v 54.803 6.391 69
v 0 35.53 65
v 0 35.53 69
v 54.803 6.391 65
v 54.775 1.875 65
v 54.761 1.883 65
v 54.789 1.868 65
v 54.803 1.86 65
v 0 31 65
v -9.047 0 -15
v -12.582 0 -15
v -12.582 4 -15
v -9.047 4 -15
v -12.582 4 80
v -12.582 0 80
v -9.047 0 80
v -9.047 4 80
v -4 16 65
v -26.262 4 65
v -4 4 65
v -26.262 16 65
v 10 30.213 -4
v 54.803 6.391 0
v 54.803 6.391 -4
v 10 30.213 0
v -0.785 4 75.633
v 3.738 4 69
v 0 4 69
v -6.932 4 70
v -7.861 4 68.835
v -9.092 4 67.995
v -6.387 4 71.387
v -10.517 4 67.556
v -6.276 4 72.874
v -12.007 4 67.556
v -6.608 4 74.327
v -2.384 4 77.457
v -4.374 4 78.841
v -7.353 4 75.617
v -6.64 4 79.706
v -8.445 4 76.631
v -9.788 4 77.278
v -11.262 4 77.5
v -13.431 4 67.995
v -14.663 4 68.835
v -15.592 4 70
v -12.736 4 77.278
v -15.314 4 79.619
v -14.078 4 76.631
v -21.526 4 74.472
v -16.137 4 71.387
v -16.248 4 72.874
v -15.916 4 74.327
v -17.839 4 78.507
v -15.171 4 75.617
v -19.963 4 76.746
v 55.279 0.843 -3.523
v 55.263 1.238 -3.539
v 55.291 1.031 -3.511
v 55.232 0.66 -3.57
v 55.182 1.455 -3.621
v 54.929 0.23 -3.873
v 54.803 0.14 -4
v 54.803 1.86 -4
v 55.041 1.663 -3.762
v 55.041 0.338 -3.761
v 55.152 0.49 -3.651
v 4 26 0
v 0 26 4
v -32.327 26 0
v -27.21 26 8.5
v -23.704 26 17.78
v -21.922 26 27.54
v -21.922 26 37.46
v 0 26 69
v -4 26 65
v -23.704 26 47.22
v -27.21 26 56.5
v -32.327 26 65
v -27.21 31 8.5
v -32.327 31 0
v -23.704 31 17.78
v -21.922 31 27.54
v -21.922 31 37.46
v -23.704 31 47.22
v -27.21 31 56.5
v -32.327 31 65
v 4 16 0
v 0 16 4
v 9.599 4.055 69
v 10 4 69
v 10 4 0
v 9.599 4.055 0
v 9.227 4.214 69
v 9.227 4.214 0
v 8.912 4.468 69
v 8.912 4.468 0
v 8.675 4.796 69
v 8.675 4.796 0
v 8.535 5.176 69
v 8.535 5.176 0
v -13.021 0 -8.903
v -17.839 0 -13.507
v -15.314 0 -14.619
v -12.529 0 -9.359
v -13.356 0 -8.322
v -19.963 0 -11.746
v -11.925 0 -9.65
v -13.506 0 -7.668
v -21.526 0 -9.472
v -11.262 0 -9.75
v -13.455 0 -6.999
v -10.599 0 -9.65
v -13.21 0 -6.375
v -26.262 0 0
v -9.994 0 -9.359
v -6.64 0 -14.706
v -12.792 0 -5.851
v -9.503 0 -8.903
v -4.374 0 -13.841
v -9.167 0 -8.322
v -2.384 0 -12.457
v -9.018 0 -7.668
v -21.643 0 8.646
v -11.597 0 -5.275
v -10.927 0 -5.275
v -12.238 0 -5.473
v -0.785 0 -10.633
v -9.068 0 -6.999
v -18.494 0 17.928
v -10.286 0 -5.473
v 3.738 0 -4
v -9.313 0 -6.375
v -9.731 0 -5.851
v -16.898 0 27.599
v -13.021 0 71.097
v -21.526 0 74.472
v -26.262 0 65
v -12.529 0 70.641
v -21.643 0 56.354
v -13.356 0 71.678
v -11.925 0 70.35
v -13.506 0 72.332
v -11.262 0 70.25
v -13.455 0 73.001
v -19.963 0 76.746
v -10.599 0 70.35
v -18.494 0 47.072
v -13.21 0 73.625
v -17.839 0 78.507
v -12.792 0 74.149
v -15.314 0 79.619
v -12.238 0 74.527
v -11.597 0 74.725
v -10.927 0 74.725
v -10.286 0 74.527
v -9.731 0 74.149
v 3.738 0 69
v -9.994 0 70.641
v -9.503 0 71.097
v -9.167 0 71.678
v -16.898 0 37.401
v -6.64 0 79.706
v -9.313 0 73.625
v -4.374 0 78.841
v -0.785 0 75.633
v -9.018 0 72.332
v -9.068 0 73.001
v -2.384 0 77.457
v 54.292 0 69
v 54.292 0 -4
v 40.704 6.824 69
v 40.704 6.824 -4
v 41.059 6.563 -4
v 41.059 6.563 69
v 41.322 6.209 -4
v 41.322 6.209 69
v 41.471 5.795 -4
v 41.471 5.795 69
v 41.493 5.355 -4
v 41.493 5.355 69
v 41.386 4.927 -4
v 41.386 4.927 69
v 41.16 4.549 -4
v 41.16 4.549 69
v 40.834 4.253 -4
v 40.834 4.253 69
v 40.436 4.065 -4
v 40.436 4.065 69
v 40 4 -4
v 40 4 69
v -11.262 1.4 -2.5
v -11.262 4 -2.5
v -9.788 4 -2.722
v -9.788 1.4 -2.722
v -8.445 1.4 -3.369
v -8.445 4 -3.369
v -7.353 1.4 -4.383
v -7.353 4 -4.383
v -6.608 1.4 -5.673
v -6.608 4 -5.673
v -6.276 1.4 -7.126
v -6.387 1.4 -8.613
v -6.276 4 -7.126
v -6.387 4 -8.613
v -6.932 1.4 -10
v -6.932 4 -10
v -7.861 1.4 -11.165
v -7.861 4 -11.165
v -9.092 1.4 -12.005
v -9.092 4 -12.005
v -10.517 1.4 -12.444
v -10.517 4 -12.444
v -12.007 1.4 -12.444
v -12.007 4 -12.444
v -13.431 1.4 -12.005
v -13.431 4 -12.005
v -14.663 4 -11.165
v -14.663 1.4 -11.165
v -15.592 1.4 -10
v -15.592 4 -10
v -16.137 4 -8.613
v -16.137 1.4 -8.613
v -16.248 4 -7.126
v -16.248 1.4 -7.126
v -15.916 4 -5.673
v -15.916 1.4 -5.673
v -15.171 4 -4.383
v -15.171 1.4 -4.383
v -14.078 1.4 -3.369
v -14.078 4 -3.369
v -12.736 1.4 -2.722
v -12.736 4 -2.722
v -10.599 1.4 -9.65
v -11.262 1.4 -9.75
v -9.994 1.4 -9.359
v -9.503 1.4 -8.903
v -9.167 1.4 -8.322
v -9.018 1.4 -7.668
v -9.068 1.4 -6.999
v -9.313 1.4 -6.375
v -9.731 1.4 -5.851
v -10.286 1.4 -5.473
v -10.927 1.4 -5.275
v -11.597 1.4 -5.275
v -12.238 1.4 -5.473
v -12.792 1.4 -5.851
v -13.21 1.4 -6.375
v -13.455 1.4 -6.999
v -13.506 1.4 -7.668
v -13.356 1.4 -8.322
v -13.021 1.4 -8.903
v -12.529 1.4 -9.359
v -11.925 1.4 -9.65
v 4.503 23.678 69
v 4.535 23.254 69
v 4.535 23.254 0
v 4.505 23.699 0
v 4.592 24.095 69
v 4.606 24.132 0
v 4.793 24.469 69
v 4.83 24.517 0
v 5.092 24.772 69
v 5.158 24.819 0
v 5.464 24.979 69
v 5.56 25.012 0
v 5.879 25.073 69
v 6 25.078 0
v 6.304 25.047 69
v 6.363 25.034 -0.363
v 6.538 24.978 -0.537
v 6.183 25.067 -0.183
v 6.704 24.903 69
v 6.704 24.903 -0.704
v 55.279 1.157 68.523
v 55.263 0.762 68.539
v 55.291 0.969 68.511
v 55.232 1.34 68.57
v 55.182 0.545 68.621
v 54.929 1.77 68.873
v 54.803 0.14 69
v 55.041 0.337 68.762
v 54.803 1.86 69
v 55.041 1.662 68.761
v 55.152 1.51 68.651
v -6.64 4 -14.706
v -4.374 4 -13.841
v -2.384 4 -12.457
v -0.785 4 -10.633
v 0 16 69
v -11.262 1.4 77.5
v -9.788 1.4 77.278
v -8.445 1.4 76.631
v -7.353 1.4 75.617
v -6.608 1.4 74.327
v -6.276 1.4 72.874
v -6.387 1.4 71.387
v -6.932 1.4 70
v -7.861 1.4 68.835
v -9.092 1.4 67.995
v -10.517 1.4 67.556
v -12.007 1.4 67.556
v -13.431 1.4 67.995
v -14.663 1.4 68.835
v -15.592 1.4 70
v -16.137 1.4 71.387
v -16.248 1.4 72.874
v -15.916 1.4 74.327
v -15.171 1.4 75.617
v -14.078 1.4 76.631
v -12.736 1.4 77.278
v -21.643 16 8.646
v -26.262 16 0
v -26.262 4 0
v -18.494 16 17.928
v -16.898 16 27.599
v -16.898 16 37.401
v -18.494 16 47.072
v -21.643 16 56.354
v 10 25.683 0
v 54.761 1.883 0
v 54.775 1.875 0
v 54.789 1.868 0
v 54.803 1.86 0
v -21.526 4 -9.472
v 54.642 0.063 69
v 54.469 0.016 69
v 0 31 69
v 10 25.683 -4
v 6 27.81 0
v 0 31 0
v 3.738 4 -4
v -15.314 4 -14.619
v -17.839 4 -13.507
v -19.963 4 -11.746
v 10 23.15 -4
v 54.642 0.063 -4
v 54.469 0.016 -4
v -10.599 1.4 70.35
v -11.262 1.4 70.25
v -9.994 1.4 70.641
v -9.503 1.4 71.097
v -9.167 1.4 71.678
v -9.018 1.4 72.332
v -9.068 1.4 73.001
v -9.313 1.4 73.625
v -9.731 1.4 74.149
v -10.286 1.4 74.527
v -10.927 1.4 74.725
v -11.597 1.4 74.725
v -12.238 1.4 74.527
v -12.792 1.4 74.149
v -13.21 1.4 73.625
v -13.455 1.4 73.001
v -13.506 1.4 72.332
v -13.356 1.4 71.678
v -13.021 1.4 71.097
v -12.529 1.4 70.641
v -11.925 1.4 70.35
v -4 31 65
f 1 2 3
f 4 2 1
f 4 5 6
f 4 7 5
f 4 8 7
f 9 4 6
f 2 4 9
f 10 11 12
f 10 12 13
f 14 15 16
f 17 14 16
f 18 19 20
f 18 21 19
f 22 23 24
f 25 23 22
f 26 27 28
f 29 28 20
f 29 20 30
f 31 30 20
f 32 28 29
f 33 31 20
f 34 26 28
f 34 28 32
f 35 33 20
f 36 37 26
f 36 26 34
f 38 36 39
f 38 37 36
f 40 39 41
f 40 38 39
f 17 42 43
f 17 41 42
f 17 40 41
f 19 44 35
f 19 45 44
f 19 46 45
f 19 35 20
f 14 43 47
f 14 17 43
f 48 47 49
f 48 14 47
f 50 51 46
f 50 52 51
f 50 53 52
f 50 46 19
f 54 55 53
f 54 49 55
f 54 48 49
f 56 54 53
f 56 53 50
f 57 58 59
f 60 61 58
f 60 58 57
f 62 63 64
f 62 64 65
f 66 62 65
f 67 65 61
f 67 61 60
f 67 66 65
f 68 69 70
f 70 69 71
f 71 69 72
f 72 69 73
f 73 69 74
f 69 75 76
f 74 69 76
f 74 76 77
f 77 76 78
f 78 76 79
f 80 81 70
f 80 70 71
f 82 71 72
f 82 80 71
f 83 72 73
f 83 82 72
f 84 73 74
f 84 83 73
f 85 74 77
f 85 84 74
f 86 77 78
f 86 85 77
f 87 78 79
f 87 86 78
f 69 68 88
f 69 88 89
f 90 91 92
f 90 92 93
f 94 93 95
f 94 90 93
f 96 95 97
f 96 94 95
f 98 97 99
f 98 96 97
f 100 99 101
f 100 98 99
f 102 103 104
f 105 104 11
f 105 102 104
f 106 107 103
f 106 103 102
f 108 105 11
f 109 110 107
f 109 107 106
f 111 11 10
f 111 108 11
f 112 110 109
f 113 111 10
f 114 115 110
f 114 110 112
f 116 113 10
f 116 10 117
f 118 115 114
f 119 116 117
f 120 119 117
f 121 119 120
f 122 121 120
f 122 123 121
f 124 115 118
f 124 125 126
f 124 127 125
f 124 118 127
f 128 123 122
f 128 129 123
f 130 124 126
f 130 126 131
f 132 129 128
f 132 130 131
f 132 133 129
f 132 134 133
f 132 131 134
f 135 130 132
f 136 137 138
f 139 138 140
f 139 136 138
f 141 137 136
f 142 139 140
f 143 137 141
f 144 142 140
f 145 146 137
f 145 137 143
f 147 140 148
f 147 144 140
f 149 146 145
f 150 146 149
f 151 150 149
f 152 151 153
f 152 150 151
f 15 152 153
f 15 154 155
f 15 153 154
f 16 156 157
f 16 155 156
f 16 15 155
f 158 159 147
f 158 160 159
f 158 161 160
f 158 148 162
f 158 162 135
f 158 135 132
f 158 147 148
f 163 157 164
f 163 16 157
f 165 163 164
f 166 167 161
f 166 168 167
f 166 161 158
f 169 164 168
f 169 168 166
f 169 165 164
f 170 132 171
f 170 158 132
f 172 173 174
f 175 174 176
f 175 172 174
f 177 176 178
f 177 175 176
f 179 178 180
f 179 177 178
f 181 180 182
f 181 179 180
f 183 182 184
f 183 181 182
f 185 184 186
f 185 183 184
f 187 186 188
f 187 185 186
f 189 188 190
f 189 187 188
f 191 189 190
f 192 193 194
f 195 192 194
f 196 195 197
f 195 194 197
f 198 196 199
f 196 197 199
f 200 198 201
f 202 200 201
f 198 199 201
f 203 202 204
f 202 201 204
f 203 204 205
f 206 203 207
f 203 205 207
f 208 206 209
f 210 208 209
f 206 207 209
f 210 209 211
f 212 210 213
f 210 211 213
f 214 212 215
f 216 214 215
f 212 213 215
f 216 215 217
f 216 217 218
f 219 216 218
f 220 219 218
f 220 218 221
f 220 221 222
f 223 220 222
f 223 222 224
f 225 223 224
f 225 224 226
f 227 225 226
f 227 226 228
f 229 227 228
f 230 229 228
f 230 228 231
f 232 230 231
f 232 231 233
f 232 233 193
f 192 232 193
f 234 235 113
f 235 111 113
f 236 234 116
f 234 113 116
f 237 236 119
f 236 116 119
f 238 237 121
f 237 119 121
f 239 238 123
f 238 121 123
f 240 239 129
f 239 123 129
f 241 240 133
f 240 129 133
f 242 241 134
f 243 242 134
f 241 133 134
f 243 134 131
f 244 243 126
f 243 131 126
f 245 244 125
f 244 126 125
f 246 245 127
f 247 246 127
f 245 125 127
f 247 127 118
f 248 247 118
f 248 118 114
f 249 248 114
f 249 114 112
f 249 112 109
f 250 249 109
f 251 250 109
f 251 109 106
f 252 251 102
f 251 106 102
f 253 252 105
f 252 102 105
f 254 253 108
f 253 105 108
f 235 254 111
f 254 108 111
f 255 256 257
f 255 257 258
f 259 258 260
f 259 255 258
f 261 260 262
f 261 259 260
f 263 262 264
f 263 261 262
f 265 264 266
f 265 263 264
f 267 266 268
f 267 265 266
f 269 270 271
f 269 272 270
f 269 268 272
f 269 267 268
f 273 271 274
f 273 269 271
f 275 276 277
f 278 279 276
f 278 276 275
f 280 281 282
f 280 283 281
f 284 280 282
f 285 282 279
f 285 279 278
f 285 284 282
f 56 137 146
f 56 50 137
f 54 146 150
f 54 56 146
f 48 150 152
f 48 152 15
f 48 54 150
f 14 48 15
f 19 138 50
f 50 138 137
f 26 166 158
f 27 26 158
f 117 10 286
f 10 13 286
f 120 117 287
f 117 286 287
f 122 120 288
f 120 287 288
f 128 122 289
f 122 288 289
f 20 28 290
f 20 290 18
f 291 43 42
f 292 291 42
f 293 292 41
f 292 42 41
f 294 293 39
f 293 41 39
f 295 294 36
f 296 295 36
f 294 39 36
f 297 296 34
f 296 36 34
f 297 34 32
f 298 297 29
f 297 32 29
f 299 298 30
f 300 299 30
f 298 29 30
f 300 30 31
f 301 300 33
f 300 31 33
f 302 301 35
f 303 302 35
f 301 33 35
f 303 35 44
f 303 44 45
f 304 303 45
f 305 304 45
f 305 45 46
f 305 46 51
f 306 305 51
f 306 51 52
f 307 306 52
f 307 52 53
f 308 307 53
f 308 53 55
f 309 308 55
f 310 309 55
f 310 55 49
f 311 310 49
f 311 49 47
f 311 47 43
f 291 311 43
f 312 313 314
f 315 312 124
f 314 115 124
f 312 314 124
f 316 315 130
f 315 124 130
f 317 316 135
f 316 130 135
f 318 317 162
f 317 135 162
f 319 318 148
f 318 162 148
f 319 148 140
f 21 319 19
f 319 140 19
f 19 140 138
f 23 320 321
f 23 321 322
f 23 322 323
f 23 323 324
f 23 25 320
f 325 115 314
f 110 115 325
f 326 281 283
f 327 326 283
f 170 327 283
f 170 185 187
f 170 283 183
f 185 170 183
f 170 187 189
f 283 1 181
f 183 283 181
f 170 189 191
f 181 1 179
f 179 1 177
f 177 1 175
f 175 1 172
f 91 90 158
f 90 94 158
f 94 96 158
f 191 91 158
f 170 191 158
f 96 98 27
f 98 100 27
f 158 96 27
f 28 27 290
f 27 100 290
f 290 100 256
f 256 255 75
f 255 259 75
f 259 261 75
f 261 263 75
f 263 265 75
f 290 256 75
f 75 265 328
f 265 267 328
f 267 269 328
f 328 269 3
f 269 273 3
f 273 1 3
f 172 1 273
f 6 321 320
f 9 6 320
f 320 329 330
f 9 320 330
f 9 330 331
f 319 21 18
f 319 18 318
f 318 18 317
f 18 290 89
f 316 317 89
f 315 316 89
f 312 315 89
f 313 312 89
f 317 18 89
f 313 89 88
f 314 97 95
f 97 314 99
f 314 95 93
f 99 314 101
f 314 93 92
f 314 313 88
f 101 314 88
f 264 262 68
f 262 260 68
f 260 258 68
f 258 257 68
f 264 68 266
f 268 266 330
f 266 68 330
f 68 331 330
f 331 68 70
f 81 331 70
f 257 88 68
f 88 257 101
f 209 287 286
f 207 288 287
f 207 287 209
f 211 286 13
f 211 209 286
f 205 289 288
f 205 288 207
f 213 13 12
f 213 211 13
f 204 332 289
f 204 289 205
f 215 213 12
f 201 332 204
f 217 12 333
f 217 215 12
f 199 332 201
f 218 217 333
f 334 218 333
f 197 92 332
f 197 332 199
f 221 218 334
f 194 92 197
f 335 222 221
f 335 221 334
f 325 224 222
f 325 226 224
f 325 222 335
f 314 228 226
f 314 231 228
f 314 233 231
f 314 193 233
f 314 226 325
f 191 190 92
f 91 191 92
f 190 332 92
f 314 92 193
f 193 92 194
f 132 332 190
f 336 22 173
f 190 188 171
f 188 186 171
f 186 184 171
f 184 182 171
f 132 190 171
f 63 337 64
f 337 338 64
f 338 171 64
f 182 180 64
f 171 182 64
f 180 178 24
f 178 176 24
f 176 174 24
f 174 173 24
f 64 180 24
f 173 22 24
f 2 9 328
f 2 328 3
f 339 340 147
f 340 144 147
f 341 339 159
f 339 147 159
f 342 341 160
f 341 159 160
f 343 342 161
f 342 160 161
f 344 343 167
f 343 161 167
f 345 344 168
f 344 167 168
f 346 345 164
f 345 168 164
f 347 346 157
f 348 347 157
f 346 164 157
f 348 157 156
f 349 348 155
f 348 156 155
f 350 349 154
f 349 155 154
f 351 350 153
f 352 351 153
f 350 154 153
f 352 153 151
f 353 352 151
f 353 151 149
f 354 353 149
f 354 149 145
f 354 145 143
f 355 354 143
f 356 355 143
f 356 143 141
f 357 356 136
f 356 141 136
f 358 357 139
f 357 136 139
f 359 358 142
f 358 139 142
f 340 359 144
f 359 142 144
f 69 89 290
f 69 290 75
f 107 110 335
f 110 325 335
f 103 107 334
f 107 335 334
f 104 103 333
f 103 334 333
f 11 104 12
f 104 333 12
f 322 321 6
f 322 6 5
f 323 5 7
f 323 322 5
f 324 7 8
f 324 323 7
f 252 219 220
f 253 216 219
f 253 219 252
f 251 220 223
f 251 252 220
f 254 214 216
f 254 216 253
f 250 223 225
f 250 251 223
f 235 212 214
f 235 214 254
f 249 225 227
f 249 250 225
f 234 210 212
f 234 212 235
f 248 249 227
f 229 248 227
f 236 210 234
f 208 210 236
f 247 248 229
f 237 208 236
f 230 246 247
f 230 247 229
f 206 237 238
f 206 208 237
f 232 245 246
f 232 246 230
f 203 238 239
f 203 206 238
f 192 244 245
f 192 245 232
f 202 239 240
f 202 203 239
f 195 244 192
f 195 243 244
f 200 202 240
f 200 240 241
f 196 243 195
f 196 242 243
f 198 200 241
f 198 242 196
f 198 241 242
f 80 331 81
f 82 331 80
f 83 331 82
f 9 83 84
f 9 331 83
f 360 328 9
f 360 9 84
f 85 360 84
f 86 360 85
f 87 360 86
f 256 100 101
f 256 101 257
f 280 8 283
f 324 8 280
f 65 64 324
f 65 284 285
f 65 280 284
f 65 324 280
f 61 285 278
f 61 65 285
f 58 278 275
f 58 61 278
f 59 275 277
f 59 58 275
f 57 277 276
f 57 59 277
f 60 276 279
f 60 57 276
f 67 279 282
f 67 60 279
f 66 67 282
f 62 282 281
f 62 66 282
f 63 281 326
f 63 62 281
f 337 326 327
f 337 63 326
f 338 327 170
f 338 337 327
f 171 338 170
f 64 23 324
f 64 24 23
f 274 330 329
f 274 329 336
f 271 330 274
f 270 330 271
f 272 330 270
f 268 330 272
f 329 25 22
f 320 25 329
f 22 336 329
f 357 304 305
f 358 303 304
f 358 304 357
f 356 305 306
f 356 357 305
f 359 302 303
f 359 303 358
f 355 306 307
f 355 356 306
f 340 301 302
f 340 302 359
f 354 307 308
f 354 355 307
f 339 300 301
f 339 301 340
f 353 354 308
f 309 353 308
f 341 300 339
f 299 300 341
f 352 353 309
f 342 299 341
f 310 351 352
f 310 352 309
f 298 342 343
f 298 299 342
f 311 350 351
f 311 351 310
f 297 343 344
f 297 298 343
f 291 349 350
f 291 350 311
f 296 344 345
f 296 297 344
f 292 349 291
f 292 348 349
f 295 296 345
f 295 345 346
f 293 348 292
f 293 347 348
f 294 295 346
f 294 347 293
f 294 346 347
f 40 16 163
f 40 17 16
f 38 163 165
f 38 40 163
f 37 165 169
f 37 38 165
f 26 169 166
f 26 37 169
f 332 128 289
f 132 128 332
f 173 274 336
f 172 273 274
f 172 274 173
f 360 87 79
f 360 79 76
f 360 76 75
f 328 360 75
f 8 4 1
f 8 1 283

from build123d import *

# Parameters (mm, degrees)
ESTRUSIONE_ESTRUSIONE1_DEPTH                         = 90
TAGLIO_ESTRUSIONE1_DEPTH                             = 60
SCHIZZO3_R                                           = 60
TAGLIO_ESTRUSIONE2_DEPTH                             = 21
ESTRUSIONE_ESTRUSIONE2_DEPTH                         = 4
FORO_LAMATO_PER_VITE_M4_A_TESTA_CILINDRI_D           = 4.5
FORO_LAMATO_PER_VITE_M4_A_TESTA_CILINDRI_DEPTH       = 8
FORO_LAMATO_PER_VITE_M4_A_TESTA_CILINDRI_CBORE_D     = 10
FORO_LAMATO_PER_VITE_M4_A_TESTA_CILINDRI_CBORE_DEPTH = 2.6
FORO_LAMATO_PER_VITE_M4_A_TESTA_CILINDRI_TIP         = 1.351936393
RACCORDO3_R                                          = 10
ESTRUSIONE_ESTRUSIONE3_DEPTH                         = 4
ESTRUSIONE_ESTRUSIONE4_DEPTH                         = 4
TAGLIO_ESTRUSIONE3_DEPTH                             = 179
SMUSSO1_SIZE                                         = 4
RACCORDO4_START                                      = -5
RACCORDO4_DEPTH                                      = 75
RACCORDO4_2_DEPTH                                    = 65
SMUSSO2_SIZE                                         = 4
SMUSSO3_SIZE                                         = 4


with BuildPart() as part:
    # Schizzo1 → Estrusione-Estrusione1 (new body)
    with BuildSketch(Plane.XY):
        Polygon((-115, 26), (0, 26), (0, 16), (-45, 16), (-45, 0), (58.302520426, 0), (0, 31), (-115, 31), align=None)
    extrude(amount=ESTRUSIONE_ESTRUSIONE1_DEPTH)

    # Schizzo2 → Taglio-Estrusione1 (cut)
    with BuildSketch(Plane(origin=(0, 31, 0), x_dir=(1, 0, 0), z_dir=(0, 1, 0))):
        with BuildLine():
            Line((-32.326881201, -65), (58.302520426, -65))
            Line((58.302520426, -65), (58.302520426, -90))
            Line((58.302520426, -90), (-115, -90))
            Line((-115, -90), (-115, 0))
            Line((-115, 0), (-32.326881201, 0))
            ThreePointArc((-32.326881201, 0), (-21.697479574, -32.5), (-32.326881201, -65))
        make_face()
    extrude(amount=-TAGLIO_ESTRUSIONE1_DEPTH, mode=Mode.SUBTRACT)

    # Schizzo3 → Taglio-Estrusione2 (cut)
    with BuildSketch(Plane.XZ):
        with Locations((-76.697479574, 32.5)):
            Circle(SCHIZZO3_R)
    extrude(amount=-TAGLIO_ESTRUSIONE2_DEPTH, mode=Mode.SUBTRACT)

    # Schizzo4 → Estrusione-Estrusione2 (add)
    with BuildSketch(Plane.XZ):
        Polygon((-26.26187707, 65), (-18.76187707, 80), (-3.76187707, 80), (3.73812293, 69), (3.73812293, 65), align=None)
        Polygon((-26.26187707, 0), (-18.76187707, -15), (-3.76187707, -15), (3.73812293, -4), (3.73812293, 0), align=None)
    extrude(amount=-ESTRUSIONE_ESTRUSIONE2_DEPTH)

    # Foro lamato per Vite M4 a testa cilindrica piana-1
    with Locations(Plane(origin=(-11.26187707, 4, 72.5), x_dir=(0, 0, 1), z_dir=(0, 1, 0))):
        with Locations((0, 0), (-80, 0)):
            CounterBoreHole(FORO_LAMATO_PER_VITE_M4_A_TESTA_CILINDRI_D / 2, FORO_LAMATO_PER_VITE_M4_A_TESTA_CILINDRI_CBORE_D / 2, FORO_LAMATO_PER_VITE_M4_A_TESTA_CILINDRI_CBORE_DEPTH, depth=FORO_LAMATO_PER_VITE_M4_A_TESTA_CILINDRI_DEPTH)
            with Locations((0, 0, -(FORO_LAMATO_PER_VITE_M4_A_TESTA_CILINDRI_DEPTH + FORO_LAMATO_PER_VITE_M4_A_TESTA_CILINDRI_TIP / 2))):  # 118° drill point
                Cone(0, FORO_LAMATO_PER_VITE_M4_A_TESTA_CILINDRI_D / 2, FORO_LAMATO_PER_VITE_M4_A_TESTA_CILINDRI_TIP, mode=Mode.SUBTRACT)

    # Raccordo3
    raccordo3_edges = [part.edges().sort_by_distance(p)[0] for p in [
        (-18.76187707, 2, 80),
        (-3.76187707, 2, 80),
        (-3.76187707, 2, -15),
        (-18.76187707, 2, -15),
    ]]
    fillet(raccordo3_edges, radius=RACCORDO3_R)

    # Schizzo9 → Estrusione-Estrusione3 (add)
    with BuildSketch(Plane.XY.offset(65)):
        Polygon((3.73812293, 0), (3.73812293, 4), (0, 4), (0, 35.530280203), (54.802520426, 6.391263214), (54.802520426, 0), align=None)
    extrude(amount=ESTRUSIONE_ESTRUSIONE3_DEPTH)

    # Schizzo10 → Estrusione-Estrusione4 (add)
    with BuildSketch(Plane(origin=(0, 0, 0), x_dir=(-1, 0, 0), z_dir=(0, 0, -1))):
        Polygon((-54.802520426, 0), (-54.802520426, 6.391263214), (-10, 30.213185886), (-10, 4), (-3.73812293, 4), (-3.73812293, 0), align=None)
    extrude(amount=ESTRUSIONE_ESTRUSIONE4_DEPTH)

    # Schizzo6 → Taglio-Estrusione3 (cut)
    with BuildSketch(Plane.XY.offset(69)):
        with BuildLine():
            Line((6.704207344, 24.902542066), (40.704207344, 6.824421389))
            ThreePointArc((40.704207344, 6.824421389), (41.455443589, 5.137117157), (40, 4))
            Line((40, 4), (10, 4))
            ThreePointArc((10, 4), (9.06087354, 4.330366941), (8.535422195, 5.175944678))
            Line((8.535422195, 5.175944678), (4.535422195, 23.254065354))
            ThreePointArc((4.535422195, 23.254065354), (5.092305295, 24.772310914), (6.704207344, 24.902542066))
        make_face()
    extrude(amount=-TAGLIO_ESTRUSIONE3_DEPTH, mode=Mode.SUBTRACT)

    # Smusso1
    # the kernel refuses this chamfer: 4 mm, written as the material it adds along each edge
    with BuildSketch(Plane(origin=(0, 15.713268048, 65), x_dir=(-1, 0, 0), z_dir=(0, 1, 0))) as smusso1_piece_1_section:
        Polygon((SMUSSO1_SIZE, 0), (0, SMUSSO1_SIZE), (0, 0), align=None)
    smusso1_piece_1 = extrude(amount=25.573463904, mode=Mode.PRIVATE)
    smusso1_piece_1 = split(smusso1_piece_1, bisect_by=Plane(origin=(0, 16, 65), z_dir=(0, -1, 0)), keep=Keep.TOP, mode=Mode.PRIVATE)
    add(smusso1_piece_1)
    with BuildSketch(Plane(origin=(0, 26, 65), x_dir=(-1, 0, 0), z_dir=(0, 1, 0))) as smusso1_piece_2:
        Polygon((SMUSSO1_SIZE, 0), (0, SMUSSO1_SIZE), (0, 0), align=None)
    extrude(amount=5)
    with BuildSketch(Plane(origin=(0, 4, 65), x_dir=(0, 0, 1), z_dir=(0, 1, 0))) as smusso1_piece_3:
        Polygon((SMUSSO1_SIZE, 0), (0, -SMUSSO1_SIZE), (0, 0), align=None)
    extrude(amount=12)
    with BuildSketch(Plane(origin=(0, -6.286731952, 65), x_dir=(0, 0, 1), z_dir=(0, 1, 0))) as smusso1_piece_4_section:
        Polygon((SMUSSO1_SIZE, 0), (0, -SMUSSO1_SIZE), (0, 0), align=None)
    smusso1_piece_4 = extrude(amount=32.573463904, mode=Mode.PRIVATE)
    smusso1_piece_4 = split(smusso1_piece_4, bisect_by=Plane(origin=(0, 26, 65), z_dir=(0, 1, 0)), keep=Keep.TOP, mode=Mode.PRIVATE)
    add(smusso1_piece_4)
    # the kernel refuses this chamfer: 4 mm, written as the material it takes off along each edge
    with BuildSketch(Plane(origin=(0, 26, 0), x_dir=(1, 0, 0), z_dir=(0, -1, 0))) as smusso1_2_piece_1:
        Polygon((SMUSSO1_SIZE, 0), (0, SMUSSO1_SIZE), (0, 0), align=None)
    extrude(amount=10, mode=Mode.SUBTRACT)

    # Raccordo4: read off the stored shape, not the designer's step
    # Raccordo4 outline → Raccordo4 (cut)
    with BuildSketch(Plane.XY.offset(RACCORDO4_START)):
        with BuildLine():
            Line((54.291739492, 0), (58.302520426, 0))
            Line((58.302520426, 0), (54.802520426, 1.860983011))
            Line((54.802520426, 1.860983011), (54.802520426, 1.859710904))
            ThreePointArc((54.802520426, 1.859710904), (55.25602962, 0.735151839), (54.291739492, 0))
        make_face()
    extrude(amount=RACCORDO4_DEPTH, mode=Mode.SUBTRACT)

    # Raccordo4 2 outline → Raccordo4 2 (cut)
    with BuildSketch(Plane.XY):
        with BuildLine():
            ThreePointArc((54.761211055, 1.882947593), (54.782003426, 1.871574022), (54.802520426, 1.859710904))
            Line((54.802520426, 1.859710904), (54.802520426, 1.860983011))
            Line((54.802520426, 1.860983011), (54.761211055, 1.882947593))
        make_face()
    extrude(amount=RACCORDO4_2_DEPTH, mode=Mode.SUBTRACT)

    # Smusso2
    # the kernel refuses this chamfer: 4 mm, written as the material it adds along each edge
    with BuildSketch(Plane(origin=(54.802520426, 12.146442856, 65), x_dir=(0, 0, 1), z_dir=(0, -1, 0))) as smusso2_piece_1_section:
        Polygon((SMUSSO2_SIZE, 0), (0, -SMUSSO2_SIZE), (0, 0), align=None)
    smusso2_piece_1 = extrude(amount=22.292885711, mode=Mode.PRIVATE)
    smusso2_piece_1 = smusso2_piece_1 & Plane(origin=(54.291739491, 1, 65), x_dir=(0.5107809344553311, 0.8597109031511343, 0), z_dir=(0, 0, -1)) * Cylinder(1, 61, mode=Mode.PRIVATE)
    add(smusso2_piece_1)
    # the kernel refuses this chamfer: 4 mm, written as the material it adds along each edge
    with BuildSketch(Plane(origin=(54.802520426, -10.146442855, 0), x_dir=(0, 0, -1), z_dir=(0, 1, 0))) as smusso2_2_piece_1_section:
        Polygon((SMUSSO2_SIZE, 0), (0, -SMUSSO2_SIZE), (0, 0), align=None)
    smusso2_2_piece_1 = extrude(amount=22.292885711, mode=Mode.PRIVATE)
    smusso2_2_piece_1 = smusso2_2_piece_1 & Plane(origin=(54.291739491, 1, 0), x_dir=(0.5107809344553311, 0.8597109031511343, 0), z_dir=(0, 0, -1)) * Cylinder(1, 61, mode=Mode.PRIVATE)
    add(smusso2_2_piece_1)

    # Smusso3
    smusso3_edges = [part.edges().sort_by_distance(p)[0] for p in [
        (10, 24.416521855, 0),
    ]]
    chamfer(smusso3_edges, length=SMUSSO3_SIZE - 0.0001)  # a hair under: the kernel refuses the full size


solid = part.part
